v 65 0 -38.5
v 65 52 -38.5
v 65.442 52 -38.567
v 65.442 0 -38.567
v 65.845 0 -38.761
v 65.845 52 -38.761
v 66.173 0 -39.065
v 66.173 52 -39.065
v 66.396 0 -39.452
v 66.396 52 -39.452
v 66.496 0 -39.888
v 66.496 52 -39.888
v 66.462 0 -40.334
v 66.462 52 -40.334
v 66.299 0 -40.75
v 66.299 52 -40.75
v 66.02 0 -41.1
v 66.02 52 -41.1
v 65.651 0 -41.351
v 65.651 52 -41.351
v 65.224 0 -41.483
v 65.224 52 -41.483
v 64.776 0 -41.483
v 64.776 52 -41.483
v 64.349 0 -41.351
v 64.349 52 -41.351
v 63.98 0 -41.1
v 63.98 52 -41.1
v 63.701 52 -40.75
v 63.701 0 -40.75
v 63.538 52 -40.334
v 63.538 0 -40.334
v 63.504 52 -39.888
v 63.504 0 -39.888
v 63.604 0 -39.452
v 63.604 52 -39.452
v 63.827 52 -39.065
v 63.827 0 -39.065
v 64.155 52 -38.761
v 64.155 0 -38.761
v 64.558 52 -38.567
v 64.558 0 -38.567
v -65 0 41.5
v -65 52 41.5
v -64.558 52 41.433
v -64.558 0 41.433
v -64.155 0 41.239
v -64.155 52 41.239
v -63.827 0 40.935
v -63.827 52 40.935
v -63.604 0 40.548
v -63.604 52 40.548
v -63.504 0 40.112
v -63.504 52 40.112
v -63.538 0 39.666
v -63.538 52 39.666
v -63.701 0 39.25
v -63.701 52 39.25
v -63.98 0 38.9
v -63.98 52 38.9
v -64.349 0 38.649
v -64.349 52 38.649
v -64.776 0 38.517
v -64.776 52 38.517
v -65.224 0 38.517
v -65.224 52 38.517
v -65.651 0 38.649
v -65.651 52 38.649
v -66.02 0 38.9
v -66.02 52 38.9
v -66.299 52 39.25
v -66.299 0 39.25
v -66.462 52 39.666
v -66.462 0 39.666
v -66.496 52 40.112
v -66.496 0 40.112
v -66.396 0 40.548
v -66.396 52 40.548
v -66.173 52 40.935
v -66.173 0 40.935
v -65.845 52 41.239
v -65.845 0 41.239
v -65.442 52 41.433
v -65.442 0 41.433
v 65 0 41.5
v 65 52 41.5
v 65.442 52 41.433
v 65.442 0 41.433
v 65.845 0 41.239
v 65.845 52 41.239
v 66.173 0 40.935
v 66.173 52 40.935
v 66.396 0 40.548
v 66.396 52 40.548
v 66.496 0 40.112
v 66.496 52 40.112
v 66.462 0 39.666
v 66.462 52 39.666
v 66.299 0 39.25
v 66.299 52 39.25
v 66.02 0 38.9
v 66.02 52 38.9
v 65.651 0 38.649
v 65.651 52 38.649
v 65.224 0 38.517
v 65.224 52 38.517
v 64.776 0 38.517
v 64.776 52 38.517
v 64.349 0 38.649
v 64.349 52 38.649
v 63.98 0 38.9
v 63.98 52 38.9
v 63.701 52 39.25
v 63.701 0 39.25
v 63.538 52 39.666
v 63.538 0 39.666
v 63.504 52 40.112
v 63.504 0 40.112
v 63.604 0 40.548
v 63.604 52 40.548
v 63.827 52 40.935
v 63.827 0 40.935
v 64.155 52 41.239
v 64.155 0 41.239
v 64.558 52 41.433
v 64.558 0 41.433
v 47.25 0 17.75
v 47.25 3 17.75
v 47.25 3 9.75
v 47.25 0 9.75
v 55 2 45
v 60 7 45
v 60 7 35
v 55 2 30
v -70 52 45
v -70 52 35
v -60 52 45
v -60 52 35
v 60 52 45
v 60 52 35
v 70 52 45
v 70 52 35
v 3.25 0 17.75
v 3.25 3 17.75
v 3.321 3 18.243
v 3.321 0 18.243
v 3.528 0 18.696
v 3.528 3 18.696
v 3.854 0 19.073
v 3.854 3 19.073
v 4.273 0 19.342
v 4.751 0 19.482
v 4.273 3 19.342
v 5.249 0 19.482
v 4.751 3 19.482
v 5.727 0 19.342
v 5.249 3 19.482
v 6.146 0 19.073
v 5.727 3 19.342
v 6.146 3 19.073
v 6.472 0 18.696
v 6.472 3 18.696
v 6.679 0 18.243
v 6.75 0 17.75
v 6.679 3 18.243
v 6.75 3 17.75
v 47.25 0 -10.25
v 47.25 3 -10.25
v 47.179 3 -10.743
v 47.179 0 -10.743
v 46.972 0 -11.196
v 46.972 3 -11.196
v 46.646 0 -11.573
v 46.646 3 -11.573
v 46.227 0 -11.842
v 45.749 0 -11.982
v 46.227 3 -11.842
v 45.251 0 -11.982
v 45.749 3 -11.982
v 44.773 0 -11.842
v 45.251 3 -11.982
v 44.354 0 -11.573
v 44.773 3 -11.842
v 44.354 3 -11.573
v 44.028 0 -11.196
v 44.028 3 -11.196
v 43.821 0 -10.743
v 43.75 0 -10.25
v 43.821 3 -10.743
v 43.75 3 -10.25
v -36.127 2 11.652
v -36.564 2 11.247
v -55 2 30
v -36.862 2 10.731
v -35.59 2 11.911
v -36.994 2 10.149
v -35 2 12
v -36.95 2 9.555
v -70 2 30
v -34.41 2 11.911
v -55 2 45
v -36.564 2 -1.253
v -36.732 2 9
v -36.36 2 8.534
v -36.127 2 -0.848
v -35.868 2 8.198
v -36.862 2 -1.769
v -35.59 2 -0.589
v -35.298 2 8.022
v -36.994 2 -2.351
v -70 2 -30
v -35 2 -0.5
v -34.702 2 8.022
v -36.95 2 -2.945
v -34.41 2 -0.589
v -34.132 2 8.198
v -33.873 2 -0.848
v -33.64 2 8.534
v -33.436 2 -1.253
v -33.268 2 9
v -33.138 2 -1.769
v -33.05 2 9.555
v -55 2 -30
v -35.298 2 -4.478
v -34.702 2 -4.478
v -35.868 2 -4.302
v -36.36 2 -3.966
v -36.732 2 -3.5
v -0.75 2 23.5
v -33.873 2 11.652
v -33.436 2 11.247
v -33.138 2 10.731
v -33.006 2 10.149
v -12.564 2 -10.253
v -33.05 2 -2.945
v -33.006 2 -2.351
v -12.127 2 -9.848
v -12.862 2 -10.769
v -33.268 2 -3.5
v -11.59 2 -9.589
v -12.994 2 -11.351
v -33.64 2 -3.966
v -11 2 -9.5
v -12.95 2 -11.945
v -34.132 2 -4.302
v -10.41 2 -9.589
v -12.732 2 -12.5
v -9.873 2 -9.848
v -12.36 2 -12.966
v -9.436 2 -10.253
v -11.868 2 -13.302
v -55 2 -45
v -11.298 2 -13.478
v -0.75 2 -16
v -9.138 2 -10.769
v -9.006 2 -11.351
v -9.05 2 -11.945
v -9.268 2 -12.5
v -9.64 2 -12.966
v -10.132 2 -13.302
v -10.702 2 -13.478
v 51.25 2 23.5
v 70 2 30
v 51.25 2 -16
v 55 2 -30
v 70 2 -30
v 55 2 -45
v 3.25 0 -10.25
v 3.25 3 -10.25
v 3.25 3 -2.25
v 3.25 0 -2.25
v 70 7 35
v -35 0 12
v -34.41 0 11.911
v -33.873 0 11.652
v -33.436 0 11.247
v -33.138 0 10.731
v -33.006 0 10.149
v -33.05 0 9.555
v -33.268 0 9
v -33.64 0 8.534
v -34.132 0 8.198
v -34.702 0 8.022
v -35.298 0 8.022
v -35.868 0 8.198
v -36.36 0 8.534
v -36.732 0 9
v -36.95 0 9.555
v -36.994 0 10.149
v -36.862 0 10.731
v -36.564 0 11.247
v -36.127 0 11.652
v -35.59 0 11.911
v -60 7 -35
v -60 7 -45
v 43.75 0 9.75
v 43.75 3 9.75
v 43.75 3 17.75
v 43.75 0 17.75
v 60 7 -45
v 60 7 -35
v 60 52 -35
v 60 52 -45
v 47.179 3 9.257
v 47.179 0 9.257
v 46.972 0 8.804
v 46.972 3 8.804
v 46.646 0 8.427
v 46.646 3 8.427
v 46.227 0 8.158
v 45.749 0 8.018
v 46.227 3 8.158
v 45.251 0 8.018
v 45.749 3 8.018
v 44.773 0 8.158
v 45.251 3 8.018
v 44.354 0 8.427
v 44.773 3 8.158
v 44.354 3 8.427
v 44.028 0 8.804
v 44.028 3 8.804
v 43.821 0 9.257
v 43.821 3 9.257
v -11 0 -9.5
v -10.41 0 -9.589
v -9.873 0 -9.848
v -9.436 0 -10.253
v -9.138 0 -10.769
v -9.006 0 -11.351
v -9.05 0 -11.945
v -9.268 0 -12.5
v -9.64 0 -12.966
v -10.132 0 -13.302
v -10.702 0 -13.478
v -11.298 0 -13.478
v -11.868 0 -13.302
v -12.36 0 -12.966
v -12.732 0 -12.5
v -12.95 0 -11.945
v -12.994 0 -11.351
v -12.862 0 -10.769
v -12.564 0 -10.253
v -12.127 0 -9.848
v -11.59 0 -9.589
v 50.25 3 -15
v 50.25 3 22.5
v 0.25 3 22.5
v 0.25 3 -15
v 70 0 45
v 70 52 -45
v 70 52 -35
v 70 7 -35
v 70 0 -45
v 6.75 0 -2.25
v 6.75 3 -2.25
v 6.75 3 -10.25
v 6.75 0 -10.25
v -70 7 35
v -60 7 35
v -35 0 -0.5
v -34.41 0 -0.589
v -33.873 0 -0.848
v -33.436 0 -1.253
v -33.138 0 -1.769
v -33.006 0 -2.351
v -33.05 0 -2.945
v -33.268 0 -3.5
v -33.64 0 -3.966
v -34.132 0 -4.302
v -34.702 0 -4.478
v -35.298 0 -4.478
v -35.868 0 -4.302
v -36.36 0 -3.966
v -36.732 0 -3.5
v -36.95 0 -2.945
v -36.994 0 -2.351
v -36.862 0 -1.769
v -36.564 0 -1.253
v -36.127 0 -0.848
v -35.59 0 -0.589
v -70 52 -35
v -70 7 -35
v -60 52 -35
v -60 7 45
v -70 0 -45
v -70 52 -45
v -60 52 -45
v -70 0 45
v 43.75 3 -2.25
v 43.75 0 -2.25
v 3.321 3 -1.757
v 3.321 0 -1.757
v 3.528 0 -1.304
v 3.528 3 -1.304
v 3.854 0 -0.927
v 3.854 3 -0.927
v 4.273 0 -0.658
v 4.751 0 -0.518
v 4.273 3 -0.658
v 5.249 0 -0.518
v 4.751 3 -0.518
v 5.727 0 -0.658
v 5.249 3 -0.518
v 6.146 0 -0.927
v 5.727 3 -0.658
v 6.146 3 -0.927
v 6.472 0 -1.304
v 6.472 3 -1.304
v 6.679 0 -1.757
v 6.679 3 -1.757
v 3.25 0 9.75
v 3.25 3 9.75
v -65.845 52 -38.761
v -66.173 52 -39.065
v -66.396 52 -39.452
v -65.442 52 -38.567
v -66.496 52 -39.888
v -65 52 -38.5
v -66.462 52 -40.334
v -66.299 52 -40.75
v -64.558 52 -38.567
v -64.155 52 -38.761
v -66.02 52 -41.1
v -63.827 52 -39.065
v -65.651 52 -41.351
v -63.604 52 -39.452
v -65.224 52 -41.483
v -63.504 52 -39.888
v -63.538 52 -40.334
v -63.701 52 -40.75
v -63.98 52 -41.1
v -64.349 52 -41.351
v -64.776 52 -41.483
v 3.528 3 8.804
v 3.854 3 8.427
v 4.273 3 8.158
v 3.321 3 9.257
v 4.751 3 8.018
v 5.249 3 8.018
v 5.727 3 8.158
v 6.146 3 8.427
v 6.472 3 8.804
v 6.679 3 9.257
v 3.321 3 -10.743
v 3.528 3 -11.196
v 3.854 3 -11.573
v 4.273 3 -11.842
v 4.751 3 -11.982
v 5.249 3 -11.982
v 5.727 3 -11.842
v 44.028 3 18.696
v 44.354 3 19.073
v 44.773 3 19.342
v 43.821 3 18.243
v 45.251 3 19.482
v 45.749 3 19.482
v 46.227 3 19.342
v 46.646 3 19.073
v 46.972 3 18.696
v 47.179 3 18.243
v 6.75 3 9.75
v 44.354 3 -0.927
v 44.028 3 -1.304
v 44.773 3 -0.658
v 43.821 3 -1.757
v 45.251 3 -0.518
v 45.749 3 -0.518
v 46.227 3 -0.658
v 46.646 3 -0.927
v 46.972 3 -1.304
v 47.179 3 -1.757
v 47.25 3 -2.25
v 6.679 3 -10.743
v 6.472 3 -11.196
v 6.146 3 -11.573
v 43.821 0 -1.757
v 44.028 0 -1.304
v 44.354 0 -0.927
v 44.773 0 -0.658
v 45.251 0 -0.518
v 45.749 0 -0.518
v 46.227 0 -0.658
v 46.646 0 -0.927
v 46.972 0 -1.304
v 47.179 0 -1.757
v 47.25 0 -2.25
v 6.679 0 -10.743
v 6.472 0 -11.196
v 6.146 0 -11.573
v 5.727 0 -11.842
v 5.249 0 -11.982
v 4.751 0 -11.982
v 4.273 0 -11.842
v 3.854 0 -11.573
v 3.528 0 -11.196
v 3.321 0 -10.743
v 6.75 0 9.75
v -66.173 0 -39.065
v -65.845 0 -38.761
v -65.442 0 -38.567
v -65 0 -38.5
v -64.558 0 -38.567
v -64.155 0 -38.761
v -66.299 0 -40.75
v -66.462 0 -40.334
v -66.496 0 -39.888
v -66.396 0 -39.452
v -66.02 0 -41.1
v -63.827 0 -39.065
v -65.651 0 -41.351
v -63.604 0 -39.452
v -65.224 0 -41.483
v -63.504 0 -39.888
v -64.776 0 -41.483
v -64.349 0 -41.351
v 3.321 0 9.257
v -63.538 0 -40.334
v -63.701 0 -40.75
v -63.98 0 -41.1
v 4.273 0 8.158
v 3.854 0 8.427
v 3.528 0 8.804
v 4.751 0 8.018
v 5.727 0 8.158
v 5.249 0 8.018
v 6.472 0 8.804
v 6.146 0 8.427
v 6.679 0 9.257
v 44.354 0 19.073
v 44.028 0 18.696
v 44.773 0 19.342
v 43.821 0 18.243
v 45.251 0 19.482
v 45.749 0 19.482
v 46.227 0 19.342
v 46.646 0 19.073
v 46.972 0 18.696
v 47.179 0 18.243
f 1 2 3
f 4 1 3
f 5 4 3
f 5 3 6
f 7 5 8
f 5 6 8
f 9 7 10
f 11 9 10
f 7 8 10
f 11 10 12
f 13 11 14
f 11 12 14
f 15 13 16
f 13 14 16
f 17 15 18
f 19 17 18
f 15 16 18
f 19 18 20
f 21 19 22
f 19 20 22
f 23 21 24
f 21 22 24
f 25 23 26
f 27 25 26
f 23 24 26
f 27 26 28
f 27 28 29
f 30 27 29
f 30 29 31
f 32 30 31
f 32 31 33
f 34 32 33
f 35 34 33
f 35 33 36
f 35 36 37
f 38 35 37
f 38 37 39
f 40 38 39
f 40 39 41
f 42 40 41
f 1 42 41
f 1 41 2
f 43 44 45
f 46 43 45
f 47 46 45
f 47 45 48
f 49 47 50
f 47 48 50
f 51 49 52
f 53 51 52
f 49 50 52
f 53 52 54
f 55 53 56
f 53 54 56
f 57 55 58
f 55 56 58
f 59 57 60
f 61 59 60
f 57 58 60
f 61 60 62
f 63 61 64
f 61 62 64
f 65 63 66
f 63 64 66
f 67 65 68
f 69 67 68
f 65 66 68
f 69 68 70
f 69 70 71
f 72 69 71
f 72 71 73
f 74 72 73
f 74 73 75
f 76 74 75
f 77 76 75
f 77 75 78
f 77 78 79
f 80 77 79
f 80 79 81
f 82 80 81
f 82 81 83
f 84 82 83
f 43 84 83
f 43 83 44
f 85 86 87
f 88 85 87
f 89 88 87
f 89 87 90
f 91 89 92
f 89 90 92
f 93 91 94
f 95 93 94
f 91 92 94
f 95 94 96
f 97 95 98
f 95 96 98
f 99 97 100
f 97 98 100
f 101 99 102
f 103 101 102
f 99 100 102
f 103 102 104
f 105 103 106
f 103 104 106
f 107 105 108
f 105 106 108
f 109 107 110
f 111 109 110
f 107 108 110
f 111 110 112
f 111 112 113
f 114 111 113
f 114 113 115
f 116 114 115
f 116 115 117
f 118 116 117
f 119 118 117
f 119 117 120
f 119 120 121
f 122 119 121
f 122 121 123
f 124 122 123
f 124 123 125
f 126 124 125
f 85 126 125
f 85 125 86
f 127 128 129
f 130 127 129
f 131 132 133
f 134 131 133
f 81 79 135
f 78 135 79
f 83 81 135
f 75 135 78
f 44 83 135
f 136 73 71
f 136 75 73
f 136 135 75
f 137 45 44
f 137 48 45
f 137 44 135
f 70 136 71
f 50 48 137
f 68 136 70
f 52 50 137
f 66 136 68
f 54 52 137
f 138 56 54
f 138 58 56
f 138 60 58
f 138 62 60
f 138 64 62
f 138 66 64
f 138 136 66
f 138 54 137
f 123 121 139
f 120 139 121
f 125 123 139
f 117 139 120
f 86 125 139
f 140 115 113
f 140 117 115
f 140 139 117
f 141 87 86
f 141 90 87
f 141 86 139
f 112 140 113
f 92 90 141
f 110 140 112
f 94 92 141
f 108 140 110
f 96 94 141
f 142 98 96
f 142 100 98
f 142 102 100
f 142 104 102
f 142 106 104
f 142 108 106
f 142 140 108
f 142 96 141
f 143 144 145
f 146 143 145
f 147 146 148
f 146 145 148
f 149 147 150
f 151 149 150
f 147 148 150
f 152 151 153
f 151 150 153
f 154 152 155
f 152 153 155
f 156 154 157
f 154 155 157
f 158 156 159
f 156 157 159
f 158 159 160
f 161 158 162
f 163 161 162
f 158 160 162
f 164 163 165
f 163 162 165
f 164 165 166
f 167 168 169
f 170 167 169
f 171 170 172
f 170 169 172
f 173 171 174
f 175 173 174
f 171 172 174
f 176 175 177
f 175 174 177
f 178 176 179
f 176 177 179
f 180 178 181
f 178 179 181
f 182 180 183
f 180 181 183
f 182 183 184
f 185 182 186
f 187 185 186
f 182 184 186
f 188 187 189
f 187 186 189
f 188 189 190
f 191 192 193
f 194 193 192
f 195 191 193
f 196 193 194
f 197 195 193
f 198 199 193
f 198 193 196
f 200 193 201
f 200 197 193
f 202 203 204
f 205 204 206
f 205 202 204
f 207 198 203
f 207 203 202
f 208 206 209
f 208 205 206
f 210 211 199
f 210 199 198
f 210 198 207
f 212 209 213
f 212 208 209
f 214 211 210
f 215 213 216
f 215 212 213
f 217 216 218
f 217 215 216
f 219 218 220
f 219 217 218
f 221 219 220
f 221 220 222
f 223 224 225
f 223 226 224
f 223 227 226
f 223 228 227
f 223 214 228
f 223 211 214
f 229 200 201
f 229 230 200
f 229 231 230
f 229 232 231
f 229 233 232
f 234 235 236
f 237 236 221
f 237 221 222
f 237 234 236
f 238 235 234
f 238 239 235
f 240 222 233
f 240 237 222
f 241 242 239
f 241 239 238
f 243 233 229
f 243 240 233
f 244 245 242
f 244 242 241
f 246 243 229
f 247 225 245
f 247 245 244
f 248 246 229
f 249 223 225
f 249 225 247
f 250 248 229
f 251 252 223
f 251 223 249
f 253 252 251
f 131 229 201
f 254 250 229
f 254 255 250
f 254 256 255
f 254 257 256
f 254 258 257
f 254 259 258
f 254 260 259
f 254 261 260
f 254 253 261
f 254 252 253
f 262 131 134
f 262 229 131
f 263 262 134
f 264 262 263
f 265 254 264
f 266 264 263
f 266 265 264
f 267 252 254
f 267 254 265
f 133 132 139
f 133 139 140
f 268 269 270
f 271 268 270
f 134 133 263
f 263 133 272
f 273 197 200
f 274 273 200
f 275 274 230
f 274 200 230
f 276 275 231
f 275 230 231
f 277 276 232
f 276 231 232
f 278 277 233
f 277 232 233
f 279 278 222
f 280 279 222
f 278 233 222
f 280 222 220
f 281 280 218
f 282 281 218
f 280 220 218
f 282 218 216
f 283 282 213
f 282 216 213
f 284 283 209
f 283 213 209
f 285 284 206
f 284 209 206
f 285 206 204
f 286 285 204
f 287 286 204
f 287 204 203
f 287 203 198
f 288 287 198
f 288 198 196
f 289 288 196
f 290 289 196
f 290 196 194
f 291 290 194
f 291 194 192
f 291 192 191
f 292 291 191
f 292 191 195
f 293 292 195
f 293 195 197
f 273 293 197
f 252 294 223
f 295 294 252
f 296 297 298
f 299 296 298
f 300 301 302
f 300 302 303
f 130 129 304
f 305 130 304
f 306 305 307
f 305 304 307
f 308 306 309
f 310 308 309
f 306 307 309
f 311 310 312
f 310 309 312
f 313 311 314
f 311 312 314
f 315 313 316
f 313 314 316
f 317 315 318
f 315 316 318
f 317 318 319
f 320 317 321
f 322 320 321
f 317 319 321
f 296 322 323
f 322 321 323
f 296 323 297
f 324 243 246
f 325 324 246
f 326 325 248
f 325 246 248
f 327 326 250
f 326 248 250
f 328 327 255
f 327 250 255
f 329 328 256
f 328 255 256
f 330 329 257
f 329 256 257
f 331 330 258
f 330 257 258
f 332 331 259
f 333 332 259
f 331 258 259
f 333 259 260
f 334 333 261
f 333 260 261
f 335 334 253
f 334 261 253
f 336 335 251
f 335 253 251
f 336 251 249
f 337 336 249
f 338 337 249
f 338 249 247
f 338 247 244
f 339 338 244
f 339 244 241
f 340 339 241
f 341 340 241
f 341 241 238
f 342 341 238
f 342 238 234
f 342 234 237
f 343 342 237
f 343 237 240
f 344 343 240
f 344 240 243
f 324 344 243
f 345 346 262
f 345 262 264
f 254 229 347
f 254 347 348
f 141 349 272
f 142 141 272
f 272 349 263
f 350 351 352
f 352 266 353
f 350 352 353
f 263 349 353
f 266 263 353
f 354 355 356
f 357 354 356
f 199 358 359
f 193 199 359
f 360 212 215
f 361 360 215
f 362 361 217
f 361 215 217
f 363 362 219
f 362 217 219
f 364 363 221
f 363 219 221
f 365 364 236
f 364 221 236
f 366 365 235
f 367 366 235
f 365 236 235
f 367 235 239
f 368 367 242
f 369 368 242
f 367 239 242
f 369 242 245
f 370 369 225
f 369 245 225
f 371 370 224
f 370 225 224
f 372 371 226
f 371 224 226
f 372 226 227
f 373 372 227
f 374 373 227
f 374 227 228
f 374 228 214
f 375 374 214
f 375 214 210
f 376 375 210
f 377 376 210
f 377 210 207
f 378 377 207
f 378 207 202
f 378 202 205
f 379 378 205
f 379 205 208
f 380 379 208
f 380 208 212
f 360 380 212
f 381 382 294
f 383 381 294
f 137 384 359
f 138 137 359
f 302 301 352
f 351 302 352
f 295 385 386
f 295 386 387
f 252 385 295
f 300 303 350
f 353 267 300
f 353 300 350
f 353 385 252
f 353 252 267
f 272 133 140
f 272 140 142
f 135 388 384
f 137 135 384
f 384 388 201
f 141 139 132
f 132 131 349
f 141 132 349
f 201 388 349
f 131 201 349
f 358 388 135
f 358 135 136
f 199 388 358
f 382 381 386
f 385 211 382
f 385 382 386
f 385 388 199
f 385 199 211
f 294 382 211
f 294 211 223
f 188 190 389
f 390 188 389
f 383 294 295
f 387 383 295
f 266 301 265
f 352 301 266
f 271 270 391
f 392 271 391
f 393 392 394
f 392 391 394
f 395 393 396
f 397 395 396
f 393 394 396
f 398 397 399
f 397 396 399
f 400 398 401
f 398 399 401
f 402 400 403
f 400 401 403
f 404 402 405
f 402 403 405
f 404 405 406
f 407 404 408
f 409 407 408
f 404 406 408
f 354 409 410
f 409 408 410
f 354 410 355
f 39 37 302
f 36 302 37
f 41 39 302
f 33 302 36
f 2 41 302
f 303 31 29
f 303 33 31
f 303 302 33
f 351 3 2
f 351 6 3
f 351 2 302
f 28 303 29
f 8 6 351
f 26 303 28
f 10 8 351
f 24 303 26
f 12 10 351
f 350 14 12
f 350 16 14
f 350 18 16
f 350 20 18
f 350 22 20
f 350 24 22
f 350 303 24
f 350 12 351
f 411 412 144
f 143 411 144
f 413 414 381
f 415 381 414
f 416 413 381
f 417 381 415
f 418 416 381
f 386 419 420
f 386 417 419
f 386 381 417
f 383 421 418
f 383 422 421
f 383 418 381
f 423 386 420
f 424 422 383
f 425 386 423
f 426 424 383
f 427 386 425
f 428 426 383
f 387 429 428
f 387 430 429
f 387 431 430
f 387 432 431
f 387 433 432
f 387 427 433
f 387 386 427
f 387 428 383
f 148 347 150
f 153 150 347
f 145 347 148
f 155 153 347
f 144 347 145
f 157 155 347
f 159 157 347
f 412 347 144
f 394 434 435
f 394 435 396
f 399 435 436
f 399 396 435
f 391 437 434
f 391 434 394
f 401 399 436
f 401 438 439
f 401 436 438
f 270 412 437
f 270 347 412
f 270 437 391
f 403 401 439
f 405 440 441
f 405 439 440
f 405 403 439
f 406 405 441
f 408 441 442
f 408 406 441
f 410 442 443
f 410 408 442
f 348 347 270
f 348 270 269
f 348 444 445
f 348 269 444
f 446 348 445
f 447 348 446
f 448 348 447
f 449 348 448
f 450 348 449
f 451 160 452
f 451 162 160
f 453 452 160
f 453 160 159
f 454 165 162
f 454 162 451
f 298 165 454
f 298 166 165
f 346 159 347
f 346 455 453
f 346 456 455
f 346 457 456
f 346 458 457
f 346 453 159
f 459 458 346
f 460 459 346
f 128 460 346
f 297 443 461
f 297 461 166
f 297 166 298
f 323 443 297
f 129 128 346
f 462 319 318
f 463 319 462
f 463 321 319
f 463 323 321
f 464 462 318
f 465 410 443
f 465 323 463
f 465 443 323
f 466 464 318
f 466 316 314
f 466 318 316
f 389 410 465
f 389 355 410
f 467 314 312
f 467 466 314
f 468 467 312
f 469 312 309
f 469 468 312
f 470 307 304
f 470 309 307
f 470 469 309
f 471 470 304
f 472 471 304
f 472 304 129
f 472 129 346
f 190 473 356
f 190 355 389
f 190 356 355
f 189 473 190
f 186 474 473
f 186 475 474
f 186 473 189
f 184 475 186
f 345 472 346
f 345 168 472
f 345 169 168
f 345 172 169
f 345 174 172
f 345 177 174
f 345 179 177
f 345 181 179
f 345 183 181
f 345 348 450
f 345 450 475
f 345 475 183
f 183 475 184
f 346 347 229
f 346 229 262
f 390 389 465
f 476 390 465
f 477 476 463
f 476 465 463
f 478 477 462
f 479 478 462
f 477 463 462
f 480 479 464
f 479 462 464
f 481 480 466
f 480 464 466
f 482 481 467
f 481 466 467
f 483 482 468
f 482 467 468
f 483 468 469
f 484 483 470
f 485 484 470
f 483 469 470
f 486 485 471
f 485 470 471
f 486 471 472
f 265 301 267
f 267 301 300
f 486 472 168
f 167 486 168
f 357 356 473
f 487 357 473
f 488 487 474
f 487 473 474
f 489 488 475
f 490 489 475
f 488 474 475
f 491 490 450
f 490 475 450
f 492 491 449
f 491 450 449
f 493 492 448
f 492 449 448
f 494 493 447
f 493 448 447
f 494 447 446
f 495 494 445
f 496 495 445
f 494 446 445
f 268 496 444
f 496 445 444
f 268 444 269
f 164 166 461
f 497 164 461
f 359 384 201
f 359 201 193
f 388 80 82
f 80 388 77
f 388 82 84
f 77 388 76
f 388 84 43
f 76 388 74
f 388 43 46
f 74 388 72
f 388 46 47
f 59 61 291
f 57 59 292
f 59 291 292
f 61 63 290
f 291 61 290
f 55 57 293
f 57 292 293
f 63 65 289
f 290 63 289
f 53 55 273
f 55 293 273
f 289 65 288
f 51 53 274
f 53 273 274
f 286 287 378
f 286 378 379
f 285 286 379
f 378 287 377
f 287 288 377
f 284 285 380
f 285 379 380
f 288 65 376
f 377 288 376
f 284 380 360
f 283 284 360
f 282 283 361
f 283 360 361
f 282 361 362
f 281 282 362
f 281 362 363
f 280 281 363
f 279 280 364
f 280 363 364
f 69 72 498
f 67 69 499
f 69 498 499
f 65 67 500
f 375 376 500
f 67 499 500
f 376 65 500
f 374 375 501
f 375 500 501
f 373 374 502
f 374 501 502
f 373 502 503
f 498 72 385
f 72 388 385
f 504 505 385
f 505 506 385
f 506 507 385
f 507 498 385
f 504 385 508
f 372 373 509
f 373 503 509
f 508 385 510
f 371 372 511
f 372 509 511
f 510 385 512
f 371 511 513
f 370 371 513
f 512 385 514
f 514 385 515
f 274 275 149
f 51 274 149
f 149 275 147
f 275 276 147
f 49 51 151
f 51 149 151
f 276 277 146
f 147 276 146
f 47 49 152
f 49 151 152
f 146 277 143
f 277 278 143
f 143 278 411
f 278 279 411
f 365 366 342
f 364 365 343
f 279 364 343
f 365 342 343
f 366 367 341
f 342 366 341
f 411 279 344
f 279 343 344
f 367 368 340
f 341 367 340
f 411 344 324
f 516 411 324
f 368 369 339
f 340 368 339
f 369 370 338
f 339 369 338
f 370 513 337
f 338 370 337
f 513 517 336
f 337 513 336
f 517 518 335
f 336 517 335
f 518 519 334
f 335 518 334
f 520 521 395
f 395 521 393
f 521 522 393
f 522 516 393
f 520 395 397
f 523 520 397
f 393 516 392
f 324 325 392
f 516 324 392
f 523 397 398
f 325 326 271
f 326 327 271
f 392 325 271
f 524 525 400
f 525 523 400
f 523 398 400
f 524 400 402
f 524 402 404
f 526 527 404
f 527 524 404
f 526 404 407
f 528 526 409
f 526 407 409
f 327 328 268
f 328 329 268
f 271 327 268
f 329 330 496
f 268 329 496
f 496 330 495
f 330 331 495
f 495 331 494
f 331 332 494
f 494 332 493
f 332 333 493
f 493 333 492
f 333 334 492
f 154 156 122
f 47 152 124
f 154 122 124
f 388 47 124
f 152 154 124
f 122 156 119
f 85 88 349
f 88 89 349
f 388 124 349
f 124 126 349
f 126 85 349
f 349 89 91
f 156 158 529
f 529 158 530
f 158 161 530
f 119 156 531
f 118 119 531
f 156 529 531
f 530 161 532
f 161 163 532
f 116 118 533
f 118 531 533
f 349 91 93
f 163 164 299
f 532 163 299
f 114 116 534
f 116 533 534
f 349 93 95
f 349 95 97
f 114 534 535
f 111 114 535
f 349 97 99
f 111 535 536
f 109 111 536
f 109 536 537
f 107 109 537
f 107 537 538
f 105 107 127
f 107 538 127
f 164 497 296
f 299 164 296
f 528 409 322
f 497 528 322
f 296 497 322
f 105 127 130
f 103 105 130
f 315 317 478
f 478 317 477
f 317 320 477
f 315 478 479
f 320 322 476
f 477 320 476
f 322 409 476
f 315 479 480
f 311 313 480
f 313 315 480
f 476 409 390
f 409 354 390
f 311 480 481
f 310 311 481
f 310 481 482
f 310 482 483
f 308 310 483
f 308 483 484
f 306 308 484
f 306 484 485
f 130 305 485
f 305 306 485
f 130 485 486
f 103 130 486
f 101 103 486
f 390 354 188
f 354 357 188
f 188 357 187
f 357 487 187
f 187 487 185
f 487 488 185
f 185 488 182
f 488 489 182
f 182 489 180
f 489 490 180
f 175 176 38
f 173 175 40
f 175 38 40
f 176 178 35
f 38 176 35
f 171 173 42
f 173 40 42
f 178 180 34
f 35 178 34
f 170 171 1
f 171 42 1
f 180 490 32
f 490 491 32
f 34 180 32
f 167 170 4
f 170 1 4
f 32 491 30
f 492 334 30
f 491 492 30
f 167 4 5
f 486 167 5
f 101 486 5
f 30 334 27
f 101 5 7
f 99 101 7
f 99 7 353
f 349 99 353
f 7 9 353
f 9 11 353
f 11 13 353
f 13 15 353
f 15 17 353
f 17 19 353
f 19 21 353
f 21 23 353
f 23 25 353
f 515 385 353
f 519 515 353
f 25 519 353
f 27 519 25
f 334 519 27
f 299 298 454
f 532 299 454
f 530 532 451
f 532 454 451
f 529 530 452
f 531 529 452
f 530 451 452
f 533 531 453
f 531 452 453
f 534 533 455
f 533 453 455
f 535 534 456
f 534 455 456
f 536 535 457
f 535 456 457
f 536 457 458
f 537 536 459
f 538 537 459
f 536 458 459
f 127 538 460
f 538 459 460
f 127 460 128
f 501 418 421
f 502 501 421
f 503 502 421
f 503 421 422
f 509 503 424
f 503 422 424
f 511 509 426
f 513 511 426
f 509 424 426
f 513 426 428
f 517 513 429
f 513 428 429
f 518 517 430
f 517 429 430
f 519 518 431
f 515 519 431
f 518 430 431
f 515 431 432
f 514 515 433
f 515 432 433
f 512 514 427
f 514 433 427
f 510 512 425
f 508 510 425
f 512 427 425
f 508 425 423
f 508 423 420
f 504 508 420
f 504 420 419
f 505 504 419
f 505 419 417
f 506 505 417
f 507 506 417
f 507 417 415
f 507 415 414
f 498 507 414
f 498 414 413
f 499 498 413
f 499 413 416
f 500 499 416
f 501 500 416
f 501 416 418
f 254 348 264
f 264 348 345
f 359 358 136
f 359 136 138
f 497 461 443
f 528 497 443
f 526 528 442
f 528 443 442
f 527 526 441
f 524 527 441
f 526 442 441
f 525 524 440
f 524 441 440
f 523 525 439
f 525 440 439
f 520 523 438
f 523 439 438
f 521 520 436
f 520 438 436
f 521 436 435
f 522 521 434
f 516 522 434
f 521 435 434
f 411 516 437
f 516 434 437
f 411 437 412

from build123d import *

# Parameters (mm, degrees)
SKETCH1_W           = 140
SKETCH1_H           = 90
BOSS_EXTRUDE1_DEPTH = 2
SKETCH2_R           = 2
CUT_EXTRUDE1_DEPTH  = 84.240615087
SKETCH3_R           = 1.75
CUT_EXTRUDE2_DEPTH  = 84.240615087
SKETCH4_W           = 10
SKETCH4_H           = 10
BOSS_EXTRUDE2_DEPTH = 50
CHAMFER1_SIZE       = 5
SKETCH6_R           = 1.5
CUT_EXTRUDE3_DEPTH  = 99.127468122
CUT_EXTRUDE4_DEPTH  = 98.082439195
BOSS_EXTRUDE3_START = 1
SKETCH8_W           = 50
SKETCH8_H           = 37.5
BOSS_EXTRUDE3_DEPTH = 1
CHAMFER2_SIZE       = 1


with BuildPart() as part:
    # Sketch1 → Boss-Extrude1 (new body)
    with BuildSketch(Plane(origin=(0, 0, 0), x_dir=(1, 0, 0), z_dir=(0, 1, 0))):
        Rectangle(SKETCH1_W, SKETCH1_H)
    extrude(amount=BOSS_EXTRUDE1_DEPTH)

    # Sketch2 → Cut-Extrude1 (cut, through all)
    with BuildSketch(Plane(origin=(0, 2, 0), x_dir=(1, 0, 0), z_dir=(0, 1, 0))):
        with Locations(Location((-35, -10, 0), (0, 0, 270))):
            Circle(SKETCH2_R)
        with Locations(Location((-35, 2.5, 0), (0, 0, 270))):
            Circle(SKETCH2_R)
        with Locations(Location((-11, 11.5, 0), (0, 0, 270))):
            Circle(SKETCH2_R)
    extrude(amount=-CUT_EXTRUDE1_DEPTH, mode=Mode.SUBTRACT)

    # Sketch3 → Cut-Extrude2 (cut, through all)
    with BuildSketch(Plane(origin=(0, 2, 0), x_dir=(1, 0, 0), z_dir=(0, 1, 0))):
        with Locations(Location((45.5, 6.25, 0), (0, 0, 270))):
            Circle(SKETCH3_R)
        with Locations(Location((45.5, -13.75, 0), (0, 0, 270))):
            Circle(SKETCH3_R)
        with Locations(Location((5, 6.25, 0), (0, 0, 270))):
            Circle(SKETCH3_R)
        with Locations(Location((5, -13.75, 0), (0, 0, 270))):
            Circle(SKETCH3_R)
    extrude(amount=-CUT_EXTRUDE2_DEPTH, mode=Mode.SUBTRACT)

    # Sketch4 → Boss-Extrude2 (add)
    with BuildSketch(Plane(origin=(0, 2, 0), x_dir=(1, 0, 0), z_dir=(0, 1, 0))):
        with Locations((-65, 40)):
            Rectangle(SKETCH4_W, SKETCH4_H)
        with Locations((65, 40)):
            Rectangle(SKETCH4_W, SKETCH4_H)
        with Locations((65, -40)):
            Rectangle(SKETCH4_W, SKETCH4_H)
        with Locations((-65, -40)):
            Rectangle(SKETCH4_W, SKETCH4_H)
    extrude(amount=BOSS_EXTRUDE2_DEPTH)

    # Chamfer1
    chamfer1_edges = [part.edges().sort_by_distance(p)[0] for p in [
        (-65, 2, -35),
        (-60, 2, -40),
        (60, 2, -40),
        (65, 2, -35),
        (65, 2, 35),
        (60, 2, 40),
        (-60, 2, 40),
        (-65, 2, 35),
    ]]
    chamfer(chamfer1_edges, length=CHAMFER1_SIZE)

    # Sketch6 → Cut-Extrude3 (cut, through all)
    with BuildSketch(Plane(origin=(0, 52, 0), x_dir=(1, 0, 0), z_dir=(0, 1, 0))):
        with Locations(Location((-65, 40, 0), (0, 0, 270))):
            Circle(SKETCH6_R)
        with Locations(Location((65, 40, 0), (0, 0, 270))):
            Circle(SKETCH6_R)
        with Locations(Location((65, -40, 0), (0, 0, 270))):
            Circle(SKETCH6_R)
        with Locations(Location((-65, -40, 0), (0, 0, 270))):
            Circle(SKETCH6_R)
    extrude(amount=-CUT_EXTRUDE3_DEPTH, mode=Mode.SUBTRACT)

    # Sketch7 → Cut-Extrude4 (cut, through all)
    with BuildSketch(Plane(origin=(0, 2, 0), x_dir=(1, 0, 0), z_dir=(0, 1, 0))):
        with BuildLine():
            Line((6.75, 10.25), (6.75, 2.25))
            ThreePointArc((6.75, 2.25), (5, 0.5), (3.25, 2.25))
            Line((3.25, 2.25), (3.25, 10.25))
            ThreePointArc((3.25, 10.25), (5, 12), (6.75, 10.25))
        make_face()
        with BuildLine():
            Line((47.25, 10.25), (47.25, 2.25))
            ThreePointArc((47.25, 2.25), (45.5, 0.5), (43.75, 2.25))
            Line((43.75, 2.25), (43.75, 10.25))
            ThreePointArc((43.75, 10.25), (45.5, 12), (47.25, 10.25))
        make_face()
        with BuildLine():
            Line((6.75, -9.75), (6.75, -17.75))
            ThreePointArc((6.75, -17.75), (5, -19.5), (3.25, -17.75))
            Line((3.25, -17.75), (3.25, -9.75))
            ThreePointArc((3.25, -9.75), (5, -8), (6.75, -9.75))
        make_face()
        with BuildLine():
            Line((43.75, -17.75), (43.75, -9.75))
            ThreePointArc((43.75, -9.75), (45.5, -8), (47.25, -9.75))
            Line((47.25, -9.75), (47.25, -17.75))
            ThreePointArc((47.25, -17.75), (45.5, -19.5), (43.75, -17.75))
        make_face()
    extrude(amount=-CUT_EXTRUDE4_DEPTH, mode=Mode.SUBTRACT)

    # Sketch8 → Boss-Extrude3 (add)
    with BuildSketch(Plane(origin=(0, 2, 0), x_dir=(1, 0, 0), z_dir=(0, 1, 0)).offset(BOSS_EXTRUDE3_START)):
        with Locations((25.25, -3.75)):
            Rectangle(SKETCH8_W, SKETCH8_H)
        with BuildLine():
            Line((47.25, 2.25), (47.25, 10.25))
            ThreePointArc((47.25, 10.25), (45.5, 12), (43.75, 10.25))
            Line((43.75, 10.25), (43.75, 2.25))
            ThreePointArc((43.75, 2.25), (45.5, 0.5), (47.25, 2.25))
        make_face(mode=Mode.SUBTRACT)
        with BuildLine():
            Line((3.25, 10.25), (3.25, 2.25))
            ThreePointArc((3.25, 2.25), (5, 0.5), (6.75, 2.25))
            Line((6.75, 2.25), (6.75, 10.25))
            ThreePointArc((6.75, 10.25), (5, 12), (3.25, 10.25))
        make_face(mode=Mode.SUBTRACT)
        with BuildLine():
            Line((47.25, -17.75), (47.25, -9.75))
            ThreePointArc((47.25, -9.75), (45.5, -8), (43.75, -9.75))
            Line((43.75, -9.75), (43.75, -17.75))
            ThreePointArc((43.75, -17.75), (45.5, -19.5), (47.25, -17.75))
        make_face(mode=Mode.SUBTRACT)
        with BuildLine():
            Line((3.25, -9.75), (3.25, -17.75))
            ThreePointArc((3.25, -17.75), (5, -19.5), (6.75, -17.75))
            Line((6.75, -17.75), (6.75, -9.75))
            ThreePointArc((6.75, -9.75), (5, -8), (3.25, -9.75))
        make_face(mode=Mode.SUBTRACT)
    extrude(amount=-BOSS_EXTRUDE3_DEPTH)

    # Chamfer2
    chamfer2_edges = [part.edges().sort_by_distance(p)[0] for p in [
        (50.25, 2, 3.75),
        (25.25, 2, -15),
        (0.25, 2, 3.75),
        (25.25, 2, 22.5),
    ]]
    chamfer(chamfer2_edges, length=CHAMFER2_SIZE - 0.0001)  # a hair under: the kernel refuses the full size


solid = part.part
